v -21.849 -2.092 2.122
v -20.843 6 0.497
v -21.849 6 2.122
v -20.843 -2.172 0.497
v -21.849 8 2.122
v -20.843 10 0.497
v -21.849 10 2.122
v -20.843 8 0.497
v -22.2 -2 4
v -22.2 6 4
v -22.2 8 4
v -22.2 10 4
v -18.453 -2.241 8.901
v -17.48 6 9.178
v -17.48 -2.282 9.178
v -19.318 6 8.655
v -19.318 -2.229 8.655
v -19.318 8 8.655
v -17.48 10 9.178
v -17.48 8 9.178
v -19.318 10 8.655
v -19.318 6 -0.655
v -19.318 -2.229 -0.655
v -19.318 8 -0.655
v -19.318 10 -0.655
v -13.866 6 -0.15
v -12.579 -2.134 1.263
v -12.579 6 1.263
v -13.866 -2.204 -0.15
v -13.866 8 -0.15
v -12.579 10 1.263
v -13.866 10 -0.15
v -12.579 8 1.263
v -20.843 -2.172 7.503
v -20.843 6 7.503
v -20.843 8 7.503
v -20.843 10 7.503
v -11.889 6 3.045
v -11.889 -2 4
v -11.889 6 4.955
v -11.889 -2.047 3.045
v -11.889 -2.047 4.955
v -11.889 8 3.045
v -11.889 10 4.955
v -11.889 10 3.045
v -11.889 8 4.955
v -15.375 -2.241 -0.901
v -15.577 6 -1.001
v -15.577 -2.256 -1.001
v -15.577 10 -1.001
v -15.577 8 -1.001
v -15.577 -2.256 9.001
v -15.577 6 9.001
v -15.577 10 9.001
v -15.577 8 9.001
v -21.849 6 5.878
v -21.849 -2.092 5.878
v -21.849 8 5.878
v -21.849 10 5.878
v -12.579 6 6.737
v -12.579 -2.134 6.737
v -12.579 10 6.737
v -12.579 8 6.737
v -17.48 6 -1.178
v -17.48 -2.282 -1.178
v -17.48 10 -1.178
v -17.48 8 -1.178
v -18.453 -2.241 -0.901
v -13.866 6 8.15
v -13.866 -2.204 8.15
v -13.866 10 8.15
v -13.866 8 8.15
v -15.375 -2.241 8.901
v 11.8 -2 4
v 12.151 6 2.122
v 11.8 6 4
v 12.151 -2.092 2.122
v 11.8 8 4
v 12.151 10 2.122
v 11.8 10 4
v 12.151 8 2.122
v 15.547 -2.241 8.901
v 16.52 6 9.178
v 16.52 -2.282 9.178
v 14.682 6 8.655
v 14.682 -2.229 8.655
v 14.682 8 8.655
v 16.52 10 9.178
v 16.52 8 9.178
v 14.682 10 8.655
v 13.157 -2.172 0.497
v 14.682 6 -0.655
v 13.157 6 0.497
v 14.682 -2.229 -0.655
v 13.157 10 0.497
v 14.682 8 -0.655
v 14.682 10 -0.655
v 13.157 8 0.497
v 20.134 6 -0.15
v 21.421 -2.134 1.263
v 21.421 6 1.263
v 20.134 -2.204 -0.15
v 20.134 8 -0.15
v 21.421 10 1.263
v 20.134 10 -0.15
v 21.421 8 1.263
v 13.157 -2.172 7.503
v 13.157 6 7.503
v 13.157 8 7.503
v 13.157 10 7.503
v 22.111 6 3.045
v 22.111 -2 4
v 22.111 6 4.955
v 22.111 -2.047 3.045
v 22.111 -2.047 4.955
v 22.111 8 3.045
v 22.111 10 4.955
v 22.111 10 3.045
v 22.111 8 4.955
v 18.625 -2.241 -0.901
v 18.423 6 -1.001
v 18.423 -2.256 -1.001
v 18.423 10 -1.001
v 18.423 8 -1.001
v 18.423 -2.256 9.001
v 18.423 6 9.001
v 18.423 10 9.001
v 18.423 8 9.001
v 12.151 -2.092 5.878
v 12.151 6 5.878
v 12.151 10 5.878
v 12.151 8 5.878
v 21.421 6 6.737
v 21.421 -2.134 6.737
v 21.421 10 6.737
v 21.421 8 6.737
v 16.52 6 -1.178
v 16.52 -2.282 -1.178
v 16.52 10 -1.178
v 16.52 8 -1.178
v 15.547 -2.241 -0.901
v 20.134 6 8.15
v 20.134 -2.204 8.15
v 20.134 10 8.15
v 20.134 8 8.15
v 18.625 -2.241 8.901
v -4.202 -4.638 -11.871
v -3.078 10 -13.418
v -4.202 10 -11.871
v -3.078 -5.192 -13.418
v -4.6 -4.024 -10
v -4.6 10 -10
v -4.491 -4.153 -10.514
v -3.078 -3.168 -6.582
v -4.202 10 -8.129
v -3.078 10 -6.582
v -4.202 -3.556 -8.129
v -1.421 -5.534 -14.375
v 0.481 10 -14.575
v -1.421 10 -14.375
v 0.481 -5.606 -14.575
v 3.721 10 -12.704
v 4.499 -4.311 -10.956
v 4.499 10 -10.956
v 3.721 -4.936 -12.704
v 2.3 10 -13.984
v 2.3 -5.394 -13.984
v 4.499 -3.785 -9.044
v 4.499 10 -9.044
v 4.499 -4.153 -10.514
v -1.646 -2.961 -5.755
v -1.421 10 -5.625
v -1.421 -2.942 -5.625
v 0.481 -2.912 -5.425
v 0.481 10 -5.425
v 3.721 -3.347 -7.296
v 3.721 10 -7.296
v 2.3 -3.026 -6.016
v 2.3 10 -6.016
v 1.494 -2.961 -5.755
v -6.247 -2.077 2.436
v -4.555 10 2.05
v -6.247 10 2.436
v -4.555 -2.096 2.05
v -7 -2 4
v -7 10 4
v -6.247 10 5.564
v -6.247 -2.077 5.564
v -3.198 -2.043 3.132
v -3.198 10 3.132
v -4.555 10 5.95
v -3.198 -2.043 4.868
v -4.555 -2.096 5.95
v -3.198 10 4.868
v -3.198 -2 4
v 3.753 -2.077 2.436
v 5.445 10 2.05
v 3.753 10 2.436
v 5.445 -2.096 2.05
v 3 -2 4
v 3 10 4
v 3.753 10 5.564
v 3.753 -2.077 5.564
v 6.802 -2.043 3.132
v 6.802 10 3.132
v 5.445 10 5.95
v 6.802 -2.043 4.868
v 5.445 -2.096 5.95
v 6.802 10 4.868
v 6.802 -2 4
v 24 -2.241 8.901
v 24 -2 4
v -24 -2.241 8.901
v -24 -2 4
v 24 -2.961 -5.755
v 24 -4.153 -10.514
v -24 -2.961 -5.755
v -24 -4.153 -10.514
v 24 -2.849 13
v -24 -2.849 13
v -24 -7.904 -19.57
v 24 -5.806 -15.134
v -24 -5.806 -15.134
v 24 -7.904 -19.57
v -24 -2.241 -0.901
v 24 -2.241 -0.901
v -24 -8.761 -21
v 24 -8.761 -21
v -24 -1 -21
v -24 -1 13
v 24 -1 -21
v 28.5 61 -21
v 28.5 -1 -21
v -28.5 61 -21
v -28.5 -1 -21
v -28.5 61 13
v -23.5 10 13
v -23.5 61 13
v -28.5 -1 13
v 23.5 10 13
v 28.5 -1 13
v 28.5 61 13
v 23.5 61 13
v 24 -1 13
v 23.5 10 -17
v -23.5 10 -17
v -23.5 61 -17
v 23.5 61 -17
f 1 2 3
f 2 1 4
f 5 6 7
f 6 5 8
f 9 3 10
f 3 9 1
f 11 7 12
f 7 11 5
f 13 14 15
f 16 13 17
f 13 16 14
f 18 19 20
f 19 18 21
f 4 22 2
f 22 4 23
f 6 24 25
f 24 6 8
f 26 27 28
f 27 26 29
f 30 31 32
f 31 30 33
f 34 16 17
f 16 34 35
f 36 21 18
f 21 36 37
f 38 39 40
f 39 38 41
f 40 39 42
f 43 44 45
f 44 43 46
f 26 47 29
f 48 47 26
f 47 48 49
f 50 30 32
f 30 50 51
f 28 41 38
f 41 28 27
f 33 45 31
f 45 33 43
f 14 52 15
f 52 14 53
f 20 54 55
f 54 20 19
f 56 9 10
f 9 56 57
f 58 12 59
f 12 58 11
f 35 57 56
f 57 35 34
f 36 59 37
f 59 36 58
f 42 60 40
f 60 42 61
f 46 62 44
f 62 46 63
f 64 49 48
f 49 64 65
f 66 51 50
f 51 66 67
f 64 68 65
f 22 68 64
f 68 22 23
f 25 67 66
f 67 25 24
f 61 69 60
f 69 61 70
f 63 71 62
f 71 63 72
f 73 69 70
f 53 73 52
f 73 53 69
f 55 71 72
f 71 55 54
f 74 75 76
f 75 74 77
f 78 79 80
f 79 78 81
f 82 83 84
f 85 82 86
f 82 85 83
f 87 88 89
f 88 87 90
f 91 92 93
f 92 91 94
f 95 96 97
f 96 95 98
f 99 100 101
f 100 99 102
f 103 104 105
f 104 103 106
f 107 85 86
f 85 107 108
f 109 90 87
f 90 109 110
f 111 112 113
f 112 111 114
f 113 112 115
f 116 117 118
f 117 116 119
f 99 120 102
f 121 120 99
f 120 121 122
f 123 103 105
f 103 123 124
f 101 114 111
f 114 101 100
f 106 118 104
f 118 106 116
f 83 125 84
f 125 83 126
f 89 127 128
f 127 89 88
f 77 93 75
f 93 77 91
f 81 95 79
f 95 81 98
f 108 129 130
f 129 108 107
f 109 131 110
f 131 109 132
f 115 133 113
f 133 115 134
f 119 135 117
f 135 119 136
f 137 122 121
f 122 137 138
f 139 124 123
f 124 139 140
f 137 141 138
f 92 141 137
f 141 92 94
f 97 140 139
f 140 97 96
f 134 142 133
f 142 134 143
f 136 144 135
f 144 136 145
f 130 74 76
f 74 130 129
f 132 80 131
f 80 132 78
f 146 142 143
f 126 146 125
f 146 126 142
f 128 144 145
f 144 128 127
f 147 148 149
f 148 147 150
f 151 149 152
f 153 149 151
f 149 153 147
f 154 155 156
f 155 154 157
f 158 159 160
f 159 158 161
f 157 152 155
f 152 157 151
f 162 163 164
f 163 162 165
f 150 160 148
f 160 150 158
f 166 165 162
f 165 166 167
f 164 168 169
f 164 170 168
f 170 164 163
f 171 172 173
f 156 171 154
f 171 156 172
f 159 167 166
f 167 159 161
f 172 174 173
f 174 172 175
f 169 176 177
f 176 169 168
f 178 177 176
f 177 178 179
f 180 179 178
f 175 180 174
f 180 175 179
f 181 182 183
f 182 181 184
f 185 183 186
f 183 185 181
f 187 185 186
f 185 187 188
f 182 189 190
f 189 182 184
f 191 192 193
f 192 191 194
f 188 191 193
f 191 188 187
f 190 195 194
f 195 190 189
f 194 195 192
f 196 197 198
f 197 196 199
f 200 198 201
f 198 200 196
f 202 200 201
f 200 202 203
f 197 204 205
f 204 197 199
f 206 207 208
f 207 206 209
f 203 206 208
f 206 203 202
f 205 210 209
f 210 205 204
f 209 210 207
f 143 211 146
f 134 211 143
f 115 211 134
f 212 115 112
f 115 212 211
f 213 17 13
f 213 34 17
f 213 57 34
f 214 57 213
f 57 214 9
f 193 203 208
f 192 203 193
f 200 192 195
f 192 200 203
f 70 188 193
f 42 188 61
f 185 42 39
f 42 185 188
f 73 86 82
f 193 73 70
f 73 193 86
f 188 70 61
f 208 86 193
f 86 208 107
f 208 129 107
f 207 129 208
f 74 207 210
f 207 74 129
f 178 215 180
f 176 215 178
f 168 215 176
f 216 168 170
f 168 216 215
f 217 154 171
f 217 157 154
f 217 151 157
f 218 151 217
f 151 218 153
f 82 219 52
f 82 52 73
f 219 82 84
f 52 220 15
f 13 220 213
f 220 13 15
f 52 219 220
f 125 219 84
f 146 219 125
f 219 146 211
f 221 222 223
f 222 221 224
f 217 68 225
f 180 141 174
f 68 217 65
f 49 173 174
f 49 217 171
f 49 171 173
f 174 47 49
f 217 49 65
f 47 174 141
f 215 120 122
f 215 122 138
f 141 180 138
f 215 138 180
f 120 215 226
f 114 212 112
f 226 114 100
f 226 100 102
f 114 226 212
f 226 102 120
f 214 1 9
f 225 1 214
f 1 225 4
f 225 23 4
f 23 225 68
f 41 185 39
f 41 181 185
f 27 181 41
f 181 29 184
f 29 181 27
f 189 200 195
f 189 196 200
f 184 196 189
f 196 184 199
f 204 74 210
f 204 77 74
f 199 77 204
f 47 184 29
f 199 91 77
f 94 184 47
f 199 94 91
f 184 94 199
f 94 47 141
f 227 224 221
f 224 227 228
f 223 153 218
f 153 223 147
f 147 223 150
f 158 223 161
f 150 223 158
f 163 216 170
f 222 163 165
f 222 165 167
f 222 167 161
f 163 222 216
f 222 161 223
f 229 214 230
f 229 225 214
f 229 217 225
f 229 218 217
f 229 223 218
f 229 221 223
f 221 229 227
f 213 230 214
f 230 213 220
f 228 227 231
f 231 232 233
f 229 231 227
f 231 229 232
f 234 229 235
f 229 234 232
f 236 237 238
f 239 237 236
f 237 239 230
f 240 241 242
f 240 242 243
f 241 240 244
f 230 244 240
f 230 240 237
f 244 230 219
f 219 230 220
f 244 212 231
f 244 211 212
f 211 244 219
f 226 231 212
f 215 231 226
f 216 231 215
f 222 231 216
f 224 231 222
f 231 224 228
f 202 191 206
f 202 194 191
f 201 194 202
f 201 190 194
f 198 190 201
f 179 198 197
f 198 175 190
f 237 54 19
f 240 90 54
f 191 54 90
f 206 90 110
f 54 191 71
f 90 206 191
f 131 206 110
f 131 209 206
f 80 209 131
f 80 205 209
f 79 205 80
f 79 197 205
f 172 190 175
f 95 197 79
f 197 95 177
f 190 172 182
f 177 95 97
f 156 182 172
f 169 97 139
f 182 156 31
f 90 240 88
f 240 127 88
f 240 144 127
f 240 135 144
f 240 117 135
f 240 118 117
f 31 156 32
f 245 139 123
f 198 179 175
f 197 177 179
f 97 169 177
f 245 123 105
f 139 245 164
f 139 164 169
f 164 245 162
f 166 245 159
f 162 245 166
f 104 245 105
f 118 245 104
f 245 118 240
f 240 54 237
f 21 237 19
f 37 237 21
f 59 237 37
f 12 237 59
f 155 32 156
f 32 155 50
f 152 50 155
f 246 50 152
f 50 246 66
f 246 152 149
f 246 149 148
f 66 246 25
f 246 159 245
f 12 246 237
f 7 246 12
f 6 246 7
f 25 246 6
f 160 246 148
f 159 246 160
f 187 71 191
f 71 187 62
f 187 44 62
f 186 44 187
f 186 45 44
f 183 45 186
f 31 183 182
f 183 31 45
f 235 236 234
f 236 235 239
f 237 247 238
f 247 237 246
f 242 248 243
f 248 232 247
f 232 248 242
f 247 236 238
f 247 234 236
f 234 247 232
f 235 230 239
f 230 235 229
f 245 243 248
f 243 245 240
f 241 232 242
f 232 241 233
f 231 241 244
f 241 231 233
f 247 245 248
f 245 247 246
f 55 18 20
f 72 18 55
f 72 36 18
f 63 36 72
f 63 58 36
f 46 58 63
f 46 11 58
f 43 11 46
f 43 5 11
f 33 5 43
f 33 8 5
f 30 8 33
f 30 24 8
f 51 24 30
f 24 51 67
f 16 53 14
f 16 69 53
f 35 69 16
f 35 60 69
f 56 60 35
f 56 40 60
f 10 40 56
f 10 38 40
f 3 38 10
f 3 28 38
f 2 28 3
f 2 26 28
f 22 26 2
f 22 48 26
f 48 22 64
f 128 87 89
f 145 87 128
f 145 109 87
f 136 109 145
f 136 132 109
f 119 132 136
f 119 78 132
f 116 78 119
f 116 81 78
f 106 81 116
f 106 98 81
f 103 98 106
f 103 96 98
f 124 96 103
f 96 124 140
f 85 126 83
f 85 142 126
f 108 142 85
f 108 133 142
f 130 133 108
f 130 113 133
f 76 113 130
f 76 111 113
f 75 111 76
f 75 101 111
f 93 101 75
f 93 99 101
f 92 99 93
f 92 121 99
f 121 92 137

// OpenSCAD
// This is the size and shape of a stack of n nyodimium mags
mirrorside1 = 12.4;
mirrorside2 = 12.5;
mirrorthick = 2;

// magradius = 5;
magradius = 5.2; // sensor: slip-on oversized magradius
melexis = 4.6;   // digital temp sensor

magthick = 3;
nummagnets = 6;

module magnet(height)
{   cylinder(r=magradius,h=height,center=true); }

module mymirror(thick)
{ cube([mirrorside1,mirrorside2,mirrorthick],center=true); }

module magnetcup(n)
{
	height = nummagnets*1.0;
	cupside = 2*magradius + 4;
	difference() {
		cube([cupside,cupside,height+4],center=true);
		translate([0,0,2])
          magnet(height+1); //bigger for subtraction
  }
}

module mirrorcup()
{	
  thick = 6;

 rotate([0,0,-90])
  difference() {
   cube([mirrorside1+4,mirrorside2+2.5,thick],center=true);
   translate([0.25,0,2]) 
      mymirror(thick+3); // thicker for subtraction

   translate([4+mirrorside/2,0,2-mirrorside])
   rotate([0,45,0])
     cube([mirrorside+8,mirrorside+8,mirrorside+8],center=true);
 translate([8,0,-2]) 
    rotate([0,45,0]) cube([5,20,8],center=true);
}
}

module mirrorframe(thick)
{	
  difference() {
   cube([30,30,thick],center=true);
   translate([-6.5,-6.5,0]) 
      cube([30,30,thick+2],center=true);
   translate([-11,-11,0])
       rotate([0,0,45])
         cube([44,44,thick+2],center=true);
  }
}

module half() {

mirrorframe(10);

translate([9.5,0.5,2.5]) 
   rotate([0,-90,0])
      mirrorcup();
translate([14.5,-9.5,2.2])
   rotate([0,-90,45])
      magnetcup(4);
}

module jarwall() {
  difference() {
     cube([40,40,120],center=true);
	  translate([40,0,0])
	     cylinder(r=50,h=120,center=true,$fn=64);
	   }
}
	
module assembly() {
	half();
   rotate([0,0,-90]) mirror([1,0,0]) half();
}

module mirrordevice() {

  difference() {
   assembly();
   translate([6,6,3]) rotate([90,0,45]) jarwall();
  }
}

module sensordevice() {
     translate([26,30,4]) cube([5,62,34],center=true);
     translate([-26,30,4]) cube([5,62,34],center=true);
     translate([0,31,19]) cube([48,60,4],center=true);
     translate([ 17,7,-4]) cube([12,2,12],center=true);
     translate([-17,7,-4]) cube([12,2,12],center=true);
	difference() {
	  translate([0,0,4]) cube([48,20,34], center=true);
translate([0,0,-4]) union() {
     translate([17,0,0]) rotate([90,0,0]) magnet(22);
     translate([-17,0,0]) rotate([90,0,0]) magnet(22);
     translate([0,0,14]) rotate([90,0,0]) cylinder(r=melexis,h=30,center=true);

     translate([5,0,0]) rotate([90,0,0]) cylinder(r=2,h=30,center=true);
     translate([-5,0,0]) rotate([90,0,0]) cylinder(r=2,h=30,center=true);

 //    translate([14,8,14]) rotate([90,0,0]) cylinder(r=1.4,h=10,center=true);
  //   translate([-14,8,14]) rotate([90,0,0]) cylinder(r=1.4,h=10,center=true);


	  translate([20,-52,0])
       rotate([0,90,0])
	     cylinder(r=50,h=120,center=true,$fn=64);
   } // end union
 }
}

rotate([0,180,0]) sensordevice();
//translate([0,-15,-2]) rotate([0,0,-135])
//                  mirrordevice();
//mirrorcup();
